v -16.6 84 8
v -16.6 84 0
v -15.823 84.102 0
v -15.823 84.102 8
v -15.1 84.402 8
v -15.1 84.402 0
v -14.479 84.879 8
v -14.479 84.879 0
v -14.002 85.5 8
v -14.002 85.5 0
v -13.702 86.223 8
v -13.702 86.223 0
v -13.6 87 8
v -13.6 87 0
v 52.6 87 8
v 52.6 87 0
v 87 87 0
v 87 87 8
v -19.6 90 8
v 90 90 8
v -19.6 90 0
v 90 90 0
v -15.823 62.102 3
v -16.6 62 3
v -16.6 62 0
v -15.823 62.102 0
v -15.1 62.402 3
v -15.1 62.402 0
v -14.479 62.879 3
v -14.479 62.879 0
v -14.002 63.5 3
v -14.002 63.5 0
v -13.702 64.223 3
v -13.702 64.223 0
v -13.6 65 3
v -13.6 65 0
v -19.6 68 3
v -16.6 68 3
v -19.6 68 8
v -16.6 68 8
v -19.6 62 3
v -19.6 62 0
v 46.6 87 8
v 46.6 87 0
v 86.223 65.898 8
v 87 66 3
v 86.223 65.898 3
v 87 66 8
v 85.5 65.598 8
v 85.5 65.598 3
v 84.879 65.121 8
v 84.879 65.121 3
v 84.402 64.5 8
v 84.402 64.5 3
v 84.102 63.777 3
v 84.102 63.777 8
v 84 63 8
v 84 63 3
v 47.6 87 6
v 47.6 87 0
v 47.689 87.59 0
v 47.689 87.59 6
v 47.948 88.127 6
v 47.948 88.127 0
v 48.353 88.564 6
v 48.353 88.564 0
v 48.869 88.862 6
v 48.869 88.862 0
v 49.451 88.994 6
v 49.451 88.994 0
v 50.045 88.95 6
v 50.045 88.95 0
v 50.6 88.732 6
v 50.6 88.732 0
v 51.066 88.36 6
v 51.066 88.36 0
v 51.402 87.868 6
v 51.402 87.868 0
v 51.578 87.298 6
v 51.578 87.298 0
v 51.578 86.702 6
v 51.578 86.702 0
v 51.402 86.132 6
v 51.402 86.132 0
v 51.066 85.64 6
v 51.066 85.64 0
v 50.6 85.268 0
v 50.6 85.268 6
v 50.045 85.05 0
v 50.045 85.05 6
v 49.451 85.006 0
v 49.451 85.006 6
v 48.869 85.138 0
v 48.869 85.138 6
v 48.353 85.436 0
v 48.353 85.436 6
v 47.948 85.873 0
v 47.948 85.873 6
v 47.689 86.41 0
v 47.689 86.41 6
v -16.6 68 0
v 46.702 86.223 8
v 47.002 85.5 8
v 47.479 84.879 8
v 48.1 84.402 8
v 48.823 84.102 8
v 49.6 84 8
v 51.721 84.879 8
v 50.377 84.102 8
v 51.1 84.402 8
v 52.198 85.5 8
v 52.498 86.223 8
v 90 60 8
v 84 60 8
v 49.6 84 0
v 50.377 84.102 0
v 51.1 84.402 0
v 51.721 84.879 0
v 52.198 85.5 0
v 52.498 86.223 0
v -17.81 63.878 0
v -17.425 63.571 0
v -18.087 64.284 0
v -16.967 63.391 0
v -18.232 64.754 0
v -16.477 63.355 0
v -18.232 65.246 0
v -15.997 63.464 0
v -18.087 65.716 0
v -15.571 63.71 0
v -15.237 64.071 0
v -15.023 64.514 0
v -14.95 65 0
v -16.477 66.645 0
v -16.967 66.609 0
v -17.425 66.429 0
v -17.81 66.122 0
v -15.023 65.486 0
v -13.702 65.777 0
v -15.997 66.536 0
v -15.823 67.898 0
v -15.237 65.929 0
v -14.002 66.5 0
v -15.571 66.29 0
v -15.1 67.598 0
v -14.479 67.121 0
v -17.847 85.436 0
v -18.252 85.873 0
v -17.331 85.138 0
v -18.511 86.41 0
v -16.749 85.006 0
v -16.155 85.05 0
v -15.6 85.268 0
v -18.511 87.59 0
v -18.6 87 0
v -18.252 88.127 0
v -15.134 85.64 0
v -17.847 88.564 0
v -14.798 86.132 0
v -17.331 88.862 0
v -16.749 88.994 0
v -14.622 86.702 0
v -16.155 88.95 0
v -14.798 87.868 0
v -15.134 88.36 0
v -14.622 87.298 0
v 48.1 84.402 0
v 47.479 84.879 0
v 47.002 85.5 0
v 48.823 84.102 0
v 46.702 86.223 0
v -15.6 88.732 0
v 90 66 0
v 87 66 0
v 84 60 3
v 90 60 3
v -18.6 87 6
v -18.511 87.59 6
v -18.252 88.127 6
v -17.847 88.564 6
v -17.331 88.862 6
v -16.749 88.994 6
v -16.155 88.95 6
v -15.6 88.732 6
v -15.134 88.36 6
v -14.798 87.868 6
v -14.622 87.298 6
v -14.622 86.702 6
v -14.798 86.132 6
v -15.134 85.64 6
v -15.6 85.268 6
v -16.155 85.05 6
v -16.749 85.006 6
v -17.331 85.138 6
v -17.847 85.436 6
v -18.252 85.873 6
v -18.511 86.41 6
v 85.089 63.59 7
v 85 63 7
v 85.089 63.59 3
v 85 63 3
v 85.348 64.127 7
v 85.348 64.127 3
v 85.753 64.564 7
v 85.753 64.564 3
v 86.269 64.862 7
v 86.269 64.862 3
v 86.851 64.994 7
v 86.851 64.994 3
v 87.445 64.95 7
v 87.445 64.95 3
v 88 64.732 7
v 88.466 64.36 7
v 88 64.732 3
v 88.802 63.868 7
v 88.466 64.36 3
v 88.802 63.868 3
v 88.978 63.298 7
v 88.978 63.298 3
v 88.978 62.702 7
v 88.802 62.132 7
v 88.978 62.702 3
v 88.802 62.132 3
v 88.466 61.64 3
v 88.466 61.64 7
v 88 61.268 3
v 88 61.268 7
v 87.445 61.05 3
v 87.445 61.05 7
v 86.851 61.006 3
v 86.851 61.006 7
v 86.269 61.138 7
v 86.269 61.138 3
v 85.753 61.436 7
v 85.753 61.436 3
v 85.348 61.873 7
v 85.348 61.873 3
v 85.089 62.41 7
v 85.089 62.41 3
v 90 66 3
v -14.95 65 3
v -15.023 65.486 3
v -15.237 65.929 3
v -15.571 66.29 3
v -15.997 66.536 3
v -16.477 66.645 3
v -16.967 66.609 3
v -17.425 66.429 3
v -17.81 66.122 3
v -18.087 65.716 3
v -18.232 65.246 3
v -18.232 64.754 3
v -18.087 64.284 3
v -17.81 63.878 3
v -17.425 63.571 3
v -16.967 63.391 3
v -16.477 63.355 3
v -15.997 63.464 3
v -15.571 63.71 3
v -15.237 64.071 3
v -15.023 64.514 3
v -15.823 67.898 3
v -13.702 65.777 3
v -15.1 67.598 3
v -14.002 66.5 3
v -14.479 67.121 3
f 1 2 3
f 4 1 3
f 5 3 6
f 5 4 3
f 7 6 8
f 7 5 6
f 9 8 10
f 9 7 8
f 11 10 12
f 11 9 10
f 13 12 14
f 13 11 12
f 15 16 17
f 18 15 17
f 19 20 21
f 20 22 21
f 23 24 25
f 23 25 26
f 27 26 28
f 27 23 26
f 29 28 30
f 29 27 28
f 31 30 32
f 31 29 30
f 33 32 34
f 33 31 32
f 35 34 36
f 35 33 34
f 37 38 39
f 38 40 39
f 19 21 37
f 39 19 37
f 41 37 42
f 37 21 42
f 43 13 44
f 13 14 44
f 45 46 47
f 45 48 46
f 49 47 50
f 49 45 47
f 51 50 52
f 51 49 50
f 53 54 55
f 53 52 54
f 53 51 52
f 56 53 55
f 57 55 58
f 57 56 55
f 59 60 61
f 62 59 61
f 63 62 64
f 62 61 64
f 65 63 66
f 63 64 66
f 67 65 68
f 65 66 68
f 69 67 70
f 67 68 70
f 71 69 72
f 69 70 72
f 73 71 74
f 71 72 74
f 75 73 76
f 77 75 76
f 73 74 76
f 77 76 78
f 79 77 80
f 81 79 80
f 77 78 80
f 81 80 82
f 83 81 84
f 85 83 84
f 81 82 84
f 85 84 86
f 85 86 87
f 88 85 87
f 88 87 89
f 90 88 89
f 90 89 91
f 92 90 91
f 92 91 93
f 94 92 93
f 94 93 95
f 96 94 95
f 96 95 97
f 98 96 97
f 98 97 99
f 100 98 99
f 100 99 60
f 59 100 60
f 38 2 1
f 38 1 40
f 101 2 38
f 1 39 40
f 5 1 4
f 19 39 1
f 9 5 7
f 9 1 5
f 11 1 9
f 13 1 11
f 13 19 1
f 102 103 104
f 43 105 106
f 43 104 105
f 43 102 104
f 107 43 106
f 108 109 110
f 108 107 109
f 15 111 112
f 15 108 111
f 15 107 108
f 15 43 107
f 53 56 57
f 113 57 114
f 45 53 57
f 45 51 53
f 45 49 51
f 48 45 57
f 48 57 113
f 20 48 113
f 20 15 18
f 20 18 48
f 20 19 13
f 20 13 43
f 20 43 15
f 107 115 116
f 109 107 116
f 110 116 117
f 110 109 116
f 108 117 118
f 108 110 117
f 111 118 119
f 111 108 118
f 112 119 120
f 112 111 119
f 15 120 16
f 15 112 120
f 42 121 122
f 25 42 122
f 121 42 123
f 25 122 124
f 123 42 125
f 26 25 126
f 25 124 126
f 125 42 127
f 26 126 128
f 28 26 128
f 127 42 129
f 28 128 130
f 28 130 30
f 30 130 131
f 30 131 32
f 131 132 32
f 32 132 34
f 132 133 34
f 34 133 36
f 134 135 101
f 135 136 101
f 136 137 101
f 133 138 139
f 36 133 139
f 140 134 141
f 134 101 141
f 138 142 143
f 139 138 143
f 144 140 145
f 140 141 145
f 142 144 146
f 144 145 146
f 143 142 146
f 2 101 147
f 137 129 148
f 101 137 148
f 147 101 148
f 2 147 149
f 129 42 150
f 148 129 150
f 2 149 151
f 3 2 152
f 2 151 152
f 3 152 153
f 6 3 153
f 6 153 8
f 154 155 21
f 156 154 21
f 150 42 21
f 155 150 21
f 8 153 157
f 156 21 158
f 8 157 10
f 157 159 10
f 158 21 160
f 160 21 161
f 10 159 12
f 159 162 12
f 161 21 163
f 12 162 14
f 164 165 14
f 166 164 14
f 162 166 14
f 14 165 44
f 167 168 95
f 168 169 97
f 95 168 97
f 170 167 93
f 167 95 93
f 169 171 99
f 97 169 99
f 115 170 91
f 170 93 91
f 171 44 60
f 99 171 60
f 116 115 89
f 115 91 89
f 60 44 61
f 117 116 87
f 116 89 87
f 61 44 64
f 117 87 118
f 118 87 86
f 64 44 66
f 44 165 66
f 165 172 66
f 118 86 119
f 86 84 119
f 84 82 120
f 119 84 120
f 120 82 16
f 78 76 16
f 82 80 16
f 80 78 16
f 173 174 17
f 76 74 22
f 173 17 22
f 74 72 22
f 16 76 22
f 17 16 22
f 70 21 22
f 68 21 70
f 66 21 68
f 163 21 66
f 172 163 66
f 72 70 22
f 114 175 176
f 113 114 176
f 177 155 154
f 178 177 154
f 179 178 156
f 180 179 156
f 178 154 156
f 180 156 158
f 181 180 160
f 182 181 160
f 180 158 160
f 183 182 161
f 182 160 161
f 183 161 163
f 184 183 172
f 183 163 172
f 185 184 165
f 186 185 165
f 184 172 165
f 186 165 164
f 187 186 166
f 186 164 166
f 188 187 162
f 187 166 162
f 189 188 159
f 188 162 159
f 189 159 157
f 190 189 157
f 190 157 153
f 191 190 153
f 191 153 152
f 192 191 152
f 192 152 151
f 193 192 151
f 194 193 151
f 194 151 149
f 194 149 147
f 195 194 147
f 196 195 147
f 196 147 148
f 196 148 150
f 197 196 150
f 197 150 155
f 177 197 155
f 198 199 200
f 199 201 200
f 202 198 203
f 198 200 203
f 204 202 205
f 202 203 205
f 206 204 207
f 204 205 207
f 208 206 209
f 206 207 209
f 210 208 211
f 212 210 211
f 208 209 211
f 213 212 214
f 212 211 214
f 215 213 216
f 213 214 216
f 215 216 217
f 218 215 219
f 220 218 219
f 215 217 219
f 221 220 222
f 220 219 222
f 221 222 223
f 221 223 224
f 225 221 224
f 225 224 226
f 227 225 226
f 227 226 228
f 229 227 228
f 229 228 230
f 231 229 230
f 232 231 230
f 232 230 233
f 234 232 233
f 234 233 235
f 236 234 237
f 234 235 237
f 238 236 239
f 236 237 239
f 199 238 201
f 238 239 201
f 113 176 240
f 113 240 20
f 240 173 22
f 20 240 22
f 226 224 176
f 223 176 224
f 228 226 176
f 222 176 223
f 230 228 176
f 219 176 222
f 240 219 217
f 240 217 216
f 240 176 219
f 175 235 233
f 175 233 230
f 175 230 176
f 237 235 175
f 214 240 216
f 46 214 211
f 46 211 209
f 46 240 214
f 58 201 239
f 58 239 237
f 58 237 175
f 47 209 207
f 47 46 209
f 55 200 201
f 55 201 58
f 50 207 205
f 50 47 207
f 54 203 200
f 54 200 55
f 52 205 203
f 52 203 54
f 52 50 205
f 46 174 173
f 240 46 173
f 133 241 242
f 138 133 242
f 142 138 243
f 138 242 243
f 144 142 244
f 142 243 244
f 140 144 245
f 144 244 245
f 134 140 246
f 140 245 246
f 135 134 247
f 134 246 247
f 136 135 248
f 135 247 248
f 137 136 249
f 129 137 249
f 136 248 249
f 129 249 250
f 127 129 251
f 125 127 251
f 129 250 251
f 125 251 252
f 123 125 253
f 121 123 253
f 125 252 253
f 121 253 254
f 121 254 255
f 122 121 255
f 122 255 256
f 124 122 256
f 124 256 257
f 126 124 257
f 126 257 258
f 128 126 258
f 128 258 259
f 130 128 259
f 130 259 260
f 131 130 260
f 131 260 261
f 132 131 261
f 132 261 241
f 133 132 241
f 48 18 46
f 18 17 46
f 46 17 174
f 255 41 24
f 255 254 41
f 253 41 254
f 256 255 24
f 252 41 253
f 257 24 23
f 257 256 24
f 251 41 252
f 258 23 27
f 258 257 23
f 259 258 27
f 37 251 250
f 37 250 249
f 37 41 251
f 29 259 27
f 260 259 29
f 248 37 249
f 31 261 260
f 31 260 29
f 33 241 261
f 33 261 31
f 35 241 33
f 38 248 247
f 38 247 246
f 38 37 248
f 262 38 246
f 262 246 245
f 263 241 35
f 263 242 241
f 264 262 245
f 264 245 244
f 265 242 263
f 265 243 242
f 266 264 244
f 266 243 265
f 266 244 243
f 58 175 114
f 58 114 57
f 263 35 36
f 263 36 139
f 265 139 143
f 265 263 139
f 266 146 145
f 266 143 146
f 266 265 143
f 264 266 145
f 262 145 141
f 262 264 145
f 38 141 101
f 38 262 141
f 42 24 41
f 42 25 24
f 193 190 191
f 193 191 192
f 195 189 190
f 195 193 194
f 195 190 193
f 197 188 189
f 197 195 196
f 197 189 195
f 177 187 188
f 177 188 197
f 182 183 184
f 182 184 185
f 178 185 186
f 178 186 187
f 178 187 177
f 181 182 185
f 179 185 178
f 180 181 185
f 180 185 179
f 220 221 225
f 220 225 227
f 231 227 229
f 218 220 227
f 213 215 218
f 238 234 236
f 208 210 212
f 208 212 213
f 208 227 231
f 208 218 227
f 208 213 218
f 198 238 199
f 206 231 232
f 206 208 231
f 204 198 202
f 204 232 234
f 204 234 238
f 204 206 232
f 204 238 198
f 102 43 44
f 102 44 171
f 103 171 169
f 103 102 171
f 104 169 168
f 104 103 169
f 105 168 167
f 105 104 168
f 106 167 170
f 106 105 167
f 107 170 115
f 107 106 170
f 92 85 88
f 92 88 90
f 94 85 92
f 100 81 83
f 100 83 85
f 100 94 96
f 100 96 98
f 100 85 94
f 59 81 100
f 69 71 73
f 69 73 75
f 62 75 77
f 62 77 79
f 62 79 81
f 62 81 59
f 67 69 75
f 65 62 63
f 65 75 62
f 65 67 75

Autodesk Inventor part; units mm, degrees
ref_plane "YZ Plane" through (0, 0, 0) normal (1, 0, 0) x (0, 1, 0)
ref_plane "XZ Plane" through (0, 0, 0) normal (0, 1, 0) x (-1, 0, 0)
ref_plane "XY Plane" through (0, 0, 0) normal (0, 0, 1) x (1, 0, 0)
sketch "Sketch1" plane through (0, 0, 0) normal (0, 0, 1) x (1, 0, 0)
  point P0 (0, 0)
sketch "Sketch2" plane through (0, 0, 0) normal (0, 0, 1) x (1, 0, 0)
  line L0 (-58, -60) -> (-60, -60) projected
  line L1 (-60, -60) -> (-60, -39.5) projected
  line L2 (-60, -39.5) -> (-58, -39.5) projected
  line L3 (-58, -39.5) -> (-58, -60) projected
  line L4 (49.6, 30) -> (51.6, 30) projected
  line L5 (51.6, 30) -> (51.6, 9.5) projected
  line L6 (51.6, 9.5) -> (49.6, 9.5) projected
  line L7 (49.6, 9.5) -> (49.6, 30) projected
  line L8 (-58, 39.5) -> (-60, 39.5) projected
  line L9 (-60, 39.5) -> (-60, 60) projected
  line L10 (-60, 60) -> (-58, 60) projected
  line L11 (-58, 60) -> (-58, 39.5) projected
  line L12 (-21.6, -39.5) -> (-19.6, -39.5) projected
  line L13 (-19.6, -39.5) -> (-19.6, -60) projected
  line L14 (-19.6, -60) -> (-21.6, -60) projected
  line L15 (-21.6, -60) -> (-21.6, -39.5) projected
  line L16 (51.6, -30) -> (49.6, -30) projected
  line L17 (49.6, -30) -> (49.6, -9.5) projected
  line L18 (49.6, -9.5) -> (51.6, -9.5) projected
  line L19 (51.6, -9.5) -> (51.6, -30) projected
  line L20 (-21.6, 60) -> (-19.6, 60) projected
  line L21 (-19.6, 60) -> (-19.6, 39.5) projected
  line L22 (-19.6, 39.5) -> (-21.6, 39.5) projected
  line L23 (-21.6, 39.5) -> (-21.6, 60) projected
  line L24 (90, -35) -> (90, 35) projected
  line L25 (90, 35) -> (49.6, 35) projected
  line L26 (49.6, 35) -> (49.6, 60) projected
  line L27 (49.6, 60) -> (90, 60) projected
  line L28 (90, 60) -> (90, 90) projected
  line L29 (90, 90) -> (-19.6, 90) projected
  line L30 (-19.6, 90) -> (-19.6, 65) projected
  line L31 (-19.6, 65) -> (-60, 65) projected
  line L32 (-60, 65) -> (-60, 90) projected
  line L33 (-60, 90) -> (-90, 90) projected
  line L34 (-90, 90) -> (-90, -90) projected
  line L35 (-90, -90) -> (-60, -90) projected
  line L36 (-60, -90) -> (-60, -65) projected
  line L37 (-60, -65) -> (-19.6, -65) projected
  line L38 (-19.6, -65) -> (-19.6, -90) projected
  line L39 (-19.6, -90) -> (90, -90) projected
  line L40 (90, -90) -> (90, -60) projected
  line L41 (90, -60) -> (49.6, -60) projected
  line L42 (49.6, -60) -> (49.6, -35) projected
  line L43 (49.6, -35) -> (90, -35) projected
  line L44 (86, -32) -> (73.8, -32) projected
  line L45 (73.8, -32) -> (73.8, -7.5) projected
  line L46 (73.8, -7.5) -> (86, -7.5) projected
  line L47 (86, -7.5) -> (86, -32) projected
  line L48 (65.8, -32) -> (53.6, -32) projected
  line L49 (53.6, -32) -> (53.6, -7.5) projected
  line L50 (53.6, -7.5) -> (65.8, -7.5) projected
  line L51 (65.8, -7.5) -> (65.8, -32) projected
  line L52 (86, -86) -> (70.6, -86) projected
  line L53 (70.6, -86) -> (70.6, -69.8) projected
  line L54 (70.6, -69.8) -> (86, -69.8) projected
  line L55 (86, -69.8) -> (86, -86) projected
  line L56 (86, 86) -> (86, 69.8) projected
  line L57 (86, 69.8) -> (70.6, 69.8) projected
  line L58 (70.6, 69.8) -> (70.6, 86) projected
  line L59 (70.6, 86) -> (86, 86) projected
  line L60 (73.8, 32) -> (86, 32) projected
  line L61 (86, 32) -> (86, 7.5) projected
  line L62 (86, 7.5) -> (73.8, 7.5) projected
  line L63 (73.8, 7.5) -> (73.8, 32) projected
  line L64 (65.8, 32) -> (65.8, 7.5) projected
  line L65 (65.8, 7.5) -> (53.6, 7.5) projected
  line L66 (53.6, 7.5) -> (53.6, 32) projected
  line L67 (53.6, 32) -> (65.8, 32) projected
  line L68 (-69.6, -87) -> (-85, -87) projected
  line L69 (-85, -87) -> (-85, -70.8) projected
  line L70 (-85, -70.8) -> (-69.6, -70.8) projected
  line L71 (-69.6, -70.8) -> (-69.6, -87) projected
  line L72 (-56, -62) -> (-56, -37.5) projected
  line L73 (-56, -37.5) -> (-43.8, -37.5) projected
  line L74 (-43.8, -37.5) -> (-43.8, -62) projected
  line L75 (-43.8, -62) -> (-56, -62) projected
  line L76 (-56, 62) -> (-43.8, 62) projected
  line L77 (-43.8, 62) -> (-43.8, 37.5) projected
  line L78 (-43.8, 37.5) -> (-56, 37.5) projected
  line L79 (-56, 37.5) -> (-56, 62) projected
  line L80 (-23.6, 62) -> (-23.6, 37.5) projected
  line L81 (-23.6, 37.5) -> (-35.8, 37.5) projected
  line L82 (-35.8, 37.5) -> (-35.8, 62) projected
  line L83 (-35.8, 62) -> (-23.6, 62) projected
  line L84 (-23.6, -62) -> (-35.8, -62) projected
  line L85 (-35.8, -62) -> (-35.8, -37.5) projected
  line L86 (-35.8, -37.5) -> (-23.6, -37.5) projected
  line L87 (-23.6, -37.5) -> (-23.6, -62) projected
  line L88 (-85, 87) -> (-69.6, 87) projected
  line L89 (-69.6, 87) -> (-69.6, 70.8) projected
  line L90 (-69.6, 70.8) -> (-85, 70.8) projected
  line L91 (-85, 70.8) -> (-85, 87) projected
  line L92 (46.6, 35) -> (49.6, 35) projected
  line L93 (49.6, 35) -> (49.6, 60) projected
  line L94 (49.6, 60) -> (84, 60) projected
  line L95 (84, 63) -> (43.6, 63) projected
  line L96 (46.6, 57) -> (46.6, 35) projected
  line L97 (90, 90) -> (87, 90)
  line L98 (87, 90) -> (87, 63)
  line L99 (87, 63) -> (90, 63)
  line L100 (90, 63) -> (90, 90)
  line L101 (87, 90) -> (-19.6, 90)
  line L102 (-19.6, 90) -> (-19.6, 87)
  line L103 (-19.6, 87) -> (87, 87)
  line L104 (87, 87) -> (87, 90)
  line L105 (-19.6, 90) -> (-16.6, 90)
  line L106 (-16.6, 90) -> (-16.6, 65)
  line L107 (-16.6, 65) -> (-19.6, 65)
  line L108 (-19.6, 65) -> (-19.6, 90)
  line L109 (-19.6, 90) -> (-13.6, 90)
  line L110 (-13.6, 90) -> (-13.6, 84)
  line L111 (-13.6, 84) -> (-19.6, 84)
  line L112 (-19.6, 84) -> (-19.6, 90)
  line L113 (90, 60) -> (84, 60)
  line L114 (84, 60) -> (84, 66)
  line L115 (84, 66) -> (90, 66)
  line L116 (90, 66) -> (90, 60)
  line L117 (-19.6, 65) -> (-16.6, 65)
  line L118 (-16.6, 65) -> (-16.6, 68)
  line L119 (-16.6, 68) -> (-19.6, 68)
  line L120 (-19.6, 68) -> (-19.6, 65)
  line L121 (-19.6, 68) -> (-13.6, 68)
  line L122 (-13.6, 68) -> (-13.6, 62)
  line L123 (-13.6, 62) -> (-19.6, 62)
  line L124 (-19.6, 62) -> (-19.6, 68)
  line L125 (46.6, 90) -> (52.6, 90)
  line L126 (52.6, 90) -> (52.6, 84)
  line L127 (52.6, 84) -> (46.6, 84)
  line L128 (46.6, 84) -> (46.6, 90)
  line L129 (84, 60) -> (84, 63) projected
  circle A0 centre (-63, -65) radius 1.5 projected
  circle A1 centre (-16.6, -87) radius 1.5 projected
  circle A2 centre (49.6, -87) radius 1.5 projected
  circle A3 centre (46.6, -60) radius 1.5 projected
  circle A4 centre (87, -63) radius 1.5 projected
  circle A5 centre (46.6, -32) radius 1.5 projected
  circle A6 centre (46.6, 32) radius 1.5 projected
  circle A7 centre (87, 63) radius 1.5 projected
  circle A8 centre (46.6, 60) radius 1.5 projected
  circle A9 centre (49.6, 87) radius 1.5 projected
  circle A10 centre (-16.6, 87) radius 1.5 projected
  circle A11 centre (-16.6, 65) radius 1.5 projected
  circle A12 centre (-63, 65) radius 1.5 projected
  line L130 (43.6, 63) -> (43.6, 57) projected
  line L131 (43.6, 57) -> (46.6, 57) projected
  point P0 (0, 0)
  point P1 (90, 63)
  point P2 (87, 66)
  point P3 (-16.6, 84)
  point P4 (-13.6, 87)
  point P5 (46.6, 87)
  point P6 (52.6, 87)
  dimension "d0" = 3
  dimension "d1" = 3
  dimension "d2" = 6
  dimension "d3" = 6
  dimension "d4" = 6
  dimension "d5" = 6
  dimension "d6" = 3
  dimension "d7" = 6
  dimension "d8" = 6
extrude "Extrusion1" add sketch "Sketch2" along normal blind 8 contours L114 L115 L98 A7 L99 L28 L27 | L99 A7 L98 L115 L28 | L115 L98 L29 L28 | A7 L98 L99 | L99 L98 A7 | L103 L126 L29 L98 | L126 L127 L128 L103 A9 | L103 A9 L128 L29 L126 | A9 L103 | L103 A9 | L128 L103 L110 L29 | L110 L103 A10 L106 L29 | L106 A10 L103 L30 L29 | L110 L111 L106 A10 L103 | L30 L119 L106 A11 L107 | L107 A11 L106 L121 L122 L123 L124 | A10 L103 L106 | L106 L103 A10 | A10 L106 L103 | L30 L111 L106 L119 | A11 L106 L107 | L107 L106 A11 | L103 A10 L106 L111 L30 | L106 A10 L103
sketch "Sketch3" plane through (0, 0, 0) normal (0, 0, -1) x (-1, 0, 0)
  line L0 (-87, 66) -> (-84, 66) projected
  line L1 (-84, 60) -> (-90, 60) projected
  line L2 (-84, 66) -> (-90, 66)
  line L3 (-90, 66) -> (-90, 60)
  line L4 (-90, 60) -> (-84, 60)
  line L5 (-84, 60) -> (-84, 66)
  point P0 (0, 0)
extrude "Extrusion2" cut sketch "Sketch3" against normal blind 3
sketch "Sketch4" plane through (0, 0, 3) normal (0, 0, -1) x (-1, 0, 0)
  line L0 (-87, 66) -> (-84, 66) projected
  line L1 (-90, 60) -> (-90, 90) projected
  line L2 (-84, 66) -> (-90, 60)
  line L3 (-90, 60) -> (-90, 66)
  line L4 (-84, 66) -> (-84, 60) projected
  line L5 (-90, 66) -> (-84, 60)
  circle A0 centre (-87, 63) radius 2
  point P0 (0, 0)
  dimension "d13" = 4
extrude "Extrusion3" cut sketch "Sketch4" against normal blind 4 contours A0 L5 L2 | L2 L5 A0 | A0 L2 L5 | L2 A0 L5
sketch "Sketch5" plane through (0, 0, 8) normal (0, 0, 1) x (1, 0, 0)
  line L0 (-13.6, 62) -> (-13.6, 68) projected
  line L1 (-19.6, 62) -> (-13.6, 62) projected
  line L2 (-13.6, 68) -> (-19.6, 68)
  line L3 (-19.6, 68) -> (-19.6, 62)
  line L4 (-19.6, 62) -> (-13.6, 62)
  line L5 (-13.6, 62) -> (-13.6, 68)
  point P0 (0, 0)
extrude "Extrusion4" cut sketch "Sketch5" against normal blind 5
sketch "Sketch6" plane through (0, 0, 3) normal (0, 0, 1) x (1, 0, 0)
  line L0 (-13.6, 68) -> (-13.6, 62) projected
  line L1 (-19.6, 62) -> (-19.6, 68) projected
  line L2 (-13.6, 68) -> (-19.6, 62)
  line L3 (-19.6, 62) -> (-19.6, 68)
  line L4 (-19.6, 68) -> (-13.6, 62)
  circle A0 centre (-16.6, 65) radius 1.65
  point P0 (0, 0)
  dimension "d18" = 3.3
extrude "Extrusion5" cut sketch "Sketch6" against normal blind 3 contours A0 L4 L2 | L2 L4 A0 | A0 L2 L4 | L2 A0 L4
sketch "Sketch7" plane through (0, 0, 0) normal (0, 0, -1) x (-1, 0, 0)
  point P0 (0, 0)
sketch "Sketch8" plane through (0, 0, 0) normal (0, 0, -1) x (-1, 0, 0)
  line L0 (-46.6, 84) -> (-52.6, 84) projected
  line L1 (-90, 90) -> (19.6, 90) projected
  line L2 (-52.6, 84) -> (-46.6, 84)
  line L3 (-46.6, 84) -> (-46.6, 90)
  line L4 (-46.6, 90) -> (-52.6, 90)
  line L5 (-52.6, 90) -> (-52.6, 84)
  line L6 (-52.6, 84) -> (-46.6, 90)
  line L7 (-46.6, 84) -> (-52.6, 90)
  circle A0 centre (-49.6, 87) radius 2
  line L8 (19.6, 90) -> (13.6, 90)
  line L9 (13.6, 90) -> (13.6, 84)
  line L10 (13.6, 84) -> (19.6, 84)
  line L11 (19.6, 84) -> (19.6, 90)
  line L12 (19.6, 90) -> (13.6, 84) construction
  line L13 (13.6, 90) -> (19.6, 84) construction
  line L14 (13.6, 84) -> (13.6, 87) projected
  circle A1 centre (16.6, 87) radius 2
  point P0 (0, 0)
  dimension "d21" = 6
  dimension "d22" = 4
  dimension "d23" = 6
  dimension "d24" = 6
  dimension "d25" = 4
extrude "Extrusion6" cut sketch "Sketch8" against normal blind 6 contours A0 L6 L7 | L7 L6 A0 | A0 L7 L6 | L6 L7 A0 | A1
fillet "Fillet1" radius 3 4 edges at (-13.6, 62, 1.5) (-13.6, 68, 1.5) (46.6, 84, 4) (52.6, 84, 4)
fillet "Fillet2" radius 3 1 edges at (-13.6, 84, 4)
fillet "Fillet3" radius 3 1 edges at (84, 66, 5.5)
properties part number "leftwall2"
